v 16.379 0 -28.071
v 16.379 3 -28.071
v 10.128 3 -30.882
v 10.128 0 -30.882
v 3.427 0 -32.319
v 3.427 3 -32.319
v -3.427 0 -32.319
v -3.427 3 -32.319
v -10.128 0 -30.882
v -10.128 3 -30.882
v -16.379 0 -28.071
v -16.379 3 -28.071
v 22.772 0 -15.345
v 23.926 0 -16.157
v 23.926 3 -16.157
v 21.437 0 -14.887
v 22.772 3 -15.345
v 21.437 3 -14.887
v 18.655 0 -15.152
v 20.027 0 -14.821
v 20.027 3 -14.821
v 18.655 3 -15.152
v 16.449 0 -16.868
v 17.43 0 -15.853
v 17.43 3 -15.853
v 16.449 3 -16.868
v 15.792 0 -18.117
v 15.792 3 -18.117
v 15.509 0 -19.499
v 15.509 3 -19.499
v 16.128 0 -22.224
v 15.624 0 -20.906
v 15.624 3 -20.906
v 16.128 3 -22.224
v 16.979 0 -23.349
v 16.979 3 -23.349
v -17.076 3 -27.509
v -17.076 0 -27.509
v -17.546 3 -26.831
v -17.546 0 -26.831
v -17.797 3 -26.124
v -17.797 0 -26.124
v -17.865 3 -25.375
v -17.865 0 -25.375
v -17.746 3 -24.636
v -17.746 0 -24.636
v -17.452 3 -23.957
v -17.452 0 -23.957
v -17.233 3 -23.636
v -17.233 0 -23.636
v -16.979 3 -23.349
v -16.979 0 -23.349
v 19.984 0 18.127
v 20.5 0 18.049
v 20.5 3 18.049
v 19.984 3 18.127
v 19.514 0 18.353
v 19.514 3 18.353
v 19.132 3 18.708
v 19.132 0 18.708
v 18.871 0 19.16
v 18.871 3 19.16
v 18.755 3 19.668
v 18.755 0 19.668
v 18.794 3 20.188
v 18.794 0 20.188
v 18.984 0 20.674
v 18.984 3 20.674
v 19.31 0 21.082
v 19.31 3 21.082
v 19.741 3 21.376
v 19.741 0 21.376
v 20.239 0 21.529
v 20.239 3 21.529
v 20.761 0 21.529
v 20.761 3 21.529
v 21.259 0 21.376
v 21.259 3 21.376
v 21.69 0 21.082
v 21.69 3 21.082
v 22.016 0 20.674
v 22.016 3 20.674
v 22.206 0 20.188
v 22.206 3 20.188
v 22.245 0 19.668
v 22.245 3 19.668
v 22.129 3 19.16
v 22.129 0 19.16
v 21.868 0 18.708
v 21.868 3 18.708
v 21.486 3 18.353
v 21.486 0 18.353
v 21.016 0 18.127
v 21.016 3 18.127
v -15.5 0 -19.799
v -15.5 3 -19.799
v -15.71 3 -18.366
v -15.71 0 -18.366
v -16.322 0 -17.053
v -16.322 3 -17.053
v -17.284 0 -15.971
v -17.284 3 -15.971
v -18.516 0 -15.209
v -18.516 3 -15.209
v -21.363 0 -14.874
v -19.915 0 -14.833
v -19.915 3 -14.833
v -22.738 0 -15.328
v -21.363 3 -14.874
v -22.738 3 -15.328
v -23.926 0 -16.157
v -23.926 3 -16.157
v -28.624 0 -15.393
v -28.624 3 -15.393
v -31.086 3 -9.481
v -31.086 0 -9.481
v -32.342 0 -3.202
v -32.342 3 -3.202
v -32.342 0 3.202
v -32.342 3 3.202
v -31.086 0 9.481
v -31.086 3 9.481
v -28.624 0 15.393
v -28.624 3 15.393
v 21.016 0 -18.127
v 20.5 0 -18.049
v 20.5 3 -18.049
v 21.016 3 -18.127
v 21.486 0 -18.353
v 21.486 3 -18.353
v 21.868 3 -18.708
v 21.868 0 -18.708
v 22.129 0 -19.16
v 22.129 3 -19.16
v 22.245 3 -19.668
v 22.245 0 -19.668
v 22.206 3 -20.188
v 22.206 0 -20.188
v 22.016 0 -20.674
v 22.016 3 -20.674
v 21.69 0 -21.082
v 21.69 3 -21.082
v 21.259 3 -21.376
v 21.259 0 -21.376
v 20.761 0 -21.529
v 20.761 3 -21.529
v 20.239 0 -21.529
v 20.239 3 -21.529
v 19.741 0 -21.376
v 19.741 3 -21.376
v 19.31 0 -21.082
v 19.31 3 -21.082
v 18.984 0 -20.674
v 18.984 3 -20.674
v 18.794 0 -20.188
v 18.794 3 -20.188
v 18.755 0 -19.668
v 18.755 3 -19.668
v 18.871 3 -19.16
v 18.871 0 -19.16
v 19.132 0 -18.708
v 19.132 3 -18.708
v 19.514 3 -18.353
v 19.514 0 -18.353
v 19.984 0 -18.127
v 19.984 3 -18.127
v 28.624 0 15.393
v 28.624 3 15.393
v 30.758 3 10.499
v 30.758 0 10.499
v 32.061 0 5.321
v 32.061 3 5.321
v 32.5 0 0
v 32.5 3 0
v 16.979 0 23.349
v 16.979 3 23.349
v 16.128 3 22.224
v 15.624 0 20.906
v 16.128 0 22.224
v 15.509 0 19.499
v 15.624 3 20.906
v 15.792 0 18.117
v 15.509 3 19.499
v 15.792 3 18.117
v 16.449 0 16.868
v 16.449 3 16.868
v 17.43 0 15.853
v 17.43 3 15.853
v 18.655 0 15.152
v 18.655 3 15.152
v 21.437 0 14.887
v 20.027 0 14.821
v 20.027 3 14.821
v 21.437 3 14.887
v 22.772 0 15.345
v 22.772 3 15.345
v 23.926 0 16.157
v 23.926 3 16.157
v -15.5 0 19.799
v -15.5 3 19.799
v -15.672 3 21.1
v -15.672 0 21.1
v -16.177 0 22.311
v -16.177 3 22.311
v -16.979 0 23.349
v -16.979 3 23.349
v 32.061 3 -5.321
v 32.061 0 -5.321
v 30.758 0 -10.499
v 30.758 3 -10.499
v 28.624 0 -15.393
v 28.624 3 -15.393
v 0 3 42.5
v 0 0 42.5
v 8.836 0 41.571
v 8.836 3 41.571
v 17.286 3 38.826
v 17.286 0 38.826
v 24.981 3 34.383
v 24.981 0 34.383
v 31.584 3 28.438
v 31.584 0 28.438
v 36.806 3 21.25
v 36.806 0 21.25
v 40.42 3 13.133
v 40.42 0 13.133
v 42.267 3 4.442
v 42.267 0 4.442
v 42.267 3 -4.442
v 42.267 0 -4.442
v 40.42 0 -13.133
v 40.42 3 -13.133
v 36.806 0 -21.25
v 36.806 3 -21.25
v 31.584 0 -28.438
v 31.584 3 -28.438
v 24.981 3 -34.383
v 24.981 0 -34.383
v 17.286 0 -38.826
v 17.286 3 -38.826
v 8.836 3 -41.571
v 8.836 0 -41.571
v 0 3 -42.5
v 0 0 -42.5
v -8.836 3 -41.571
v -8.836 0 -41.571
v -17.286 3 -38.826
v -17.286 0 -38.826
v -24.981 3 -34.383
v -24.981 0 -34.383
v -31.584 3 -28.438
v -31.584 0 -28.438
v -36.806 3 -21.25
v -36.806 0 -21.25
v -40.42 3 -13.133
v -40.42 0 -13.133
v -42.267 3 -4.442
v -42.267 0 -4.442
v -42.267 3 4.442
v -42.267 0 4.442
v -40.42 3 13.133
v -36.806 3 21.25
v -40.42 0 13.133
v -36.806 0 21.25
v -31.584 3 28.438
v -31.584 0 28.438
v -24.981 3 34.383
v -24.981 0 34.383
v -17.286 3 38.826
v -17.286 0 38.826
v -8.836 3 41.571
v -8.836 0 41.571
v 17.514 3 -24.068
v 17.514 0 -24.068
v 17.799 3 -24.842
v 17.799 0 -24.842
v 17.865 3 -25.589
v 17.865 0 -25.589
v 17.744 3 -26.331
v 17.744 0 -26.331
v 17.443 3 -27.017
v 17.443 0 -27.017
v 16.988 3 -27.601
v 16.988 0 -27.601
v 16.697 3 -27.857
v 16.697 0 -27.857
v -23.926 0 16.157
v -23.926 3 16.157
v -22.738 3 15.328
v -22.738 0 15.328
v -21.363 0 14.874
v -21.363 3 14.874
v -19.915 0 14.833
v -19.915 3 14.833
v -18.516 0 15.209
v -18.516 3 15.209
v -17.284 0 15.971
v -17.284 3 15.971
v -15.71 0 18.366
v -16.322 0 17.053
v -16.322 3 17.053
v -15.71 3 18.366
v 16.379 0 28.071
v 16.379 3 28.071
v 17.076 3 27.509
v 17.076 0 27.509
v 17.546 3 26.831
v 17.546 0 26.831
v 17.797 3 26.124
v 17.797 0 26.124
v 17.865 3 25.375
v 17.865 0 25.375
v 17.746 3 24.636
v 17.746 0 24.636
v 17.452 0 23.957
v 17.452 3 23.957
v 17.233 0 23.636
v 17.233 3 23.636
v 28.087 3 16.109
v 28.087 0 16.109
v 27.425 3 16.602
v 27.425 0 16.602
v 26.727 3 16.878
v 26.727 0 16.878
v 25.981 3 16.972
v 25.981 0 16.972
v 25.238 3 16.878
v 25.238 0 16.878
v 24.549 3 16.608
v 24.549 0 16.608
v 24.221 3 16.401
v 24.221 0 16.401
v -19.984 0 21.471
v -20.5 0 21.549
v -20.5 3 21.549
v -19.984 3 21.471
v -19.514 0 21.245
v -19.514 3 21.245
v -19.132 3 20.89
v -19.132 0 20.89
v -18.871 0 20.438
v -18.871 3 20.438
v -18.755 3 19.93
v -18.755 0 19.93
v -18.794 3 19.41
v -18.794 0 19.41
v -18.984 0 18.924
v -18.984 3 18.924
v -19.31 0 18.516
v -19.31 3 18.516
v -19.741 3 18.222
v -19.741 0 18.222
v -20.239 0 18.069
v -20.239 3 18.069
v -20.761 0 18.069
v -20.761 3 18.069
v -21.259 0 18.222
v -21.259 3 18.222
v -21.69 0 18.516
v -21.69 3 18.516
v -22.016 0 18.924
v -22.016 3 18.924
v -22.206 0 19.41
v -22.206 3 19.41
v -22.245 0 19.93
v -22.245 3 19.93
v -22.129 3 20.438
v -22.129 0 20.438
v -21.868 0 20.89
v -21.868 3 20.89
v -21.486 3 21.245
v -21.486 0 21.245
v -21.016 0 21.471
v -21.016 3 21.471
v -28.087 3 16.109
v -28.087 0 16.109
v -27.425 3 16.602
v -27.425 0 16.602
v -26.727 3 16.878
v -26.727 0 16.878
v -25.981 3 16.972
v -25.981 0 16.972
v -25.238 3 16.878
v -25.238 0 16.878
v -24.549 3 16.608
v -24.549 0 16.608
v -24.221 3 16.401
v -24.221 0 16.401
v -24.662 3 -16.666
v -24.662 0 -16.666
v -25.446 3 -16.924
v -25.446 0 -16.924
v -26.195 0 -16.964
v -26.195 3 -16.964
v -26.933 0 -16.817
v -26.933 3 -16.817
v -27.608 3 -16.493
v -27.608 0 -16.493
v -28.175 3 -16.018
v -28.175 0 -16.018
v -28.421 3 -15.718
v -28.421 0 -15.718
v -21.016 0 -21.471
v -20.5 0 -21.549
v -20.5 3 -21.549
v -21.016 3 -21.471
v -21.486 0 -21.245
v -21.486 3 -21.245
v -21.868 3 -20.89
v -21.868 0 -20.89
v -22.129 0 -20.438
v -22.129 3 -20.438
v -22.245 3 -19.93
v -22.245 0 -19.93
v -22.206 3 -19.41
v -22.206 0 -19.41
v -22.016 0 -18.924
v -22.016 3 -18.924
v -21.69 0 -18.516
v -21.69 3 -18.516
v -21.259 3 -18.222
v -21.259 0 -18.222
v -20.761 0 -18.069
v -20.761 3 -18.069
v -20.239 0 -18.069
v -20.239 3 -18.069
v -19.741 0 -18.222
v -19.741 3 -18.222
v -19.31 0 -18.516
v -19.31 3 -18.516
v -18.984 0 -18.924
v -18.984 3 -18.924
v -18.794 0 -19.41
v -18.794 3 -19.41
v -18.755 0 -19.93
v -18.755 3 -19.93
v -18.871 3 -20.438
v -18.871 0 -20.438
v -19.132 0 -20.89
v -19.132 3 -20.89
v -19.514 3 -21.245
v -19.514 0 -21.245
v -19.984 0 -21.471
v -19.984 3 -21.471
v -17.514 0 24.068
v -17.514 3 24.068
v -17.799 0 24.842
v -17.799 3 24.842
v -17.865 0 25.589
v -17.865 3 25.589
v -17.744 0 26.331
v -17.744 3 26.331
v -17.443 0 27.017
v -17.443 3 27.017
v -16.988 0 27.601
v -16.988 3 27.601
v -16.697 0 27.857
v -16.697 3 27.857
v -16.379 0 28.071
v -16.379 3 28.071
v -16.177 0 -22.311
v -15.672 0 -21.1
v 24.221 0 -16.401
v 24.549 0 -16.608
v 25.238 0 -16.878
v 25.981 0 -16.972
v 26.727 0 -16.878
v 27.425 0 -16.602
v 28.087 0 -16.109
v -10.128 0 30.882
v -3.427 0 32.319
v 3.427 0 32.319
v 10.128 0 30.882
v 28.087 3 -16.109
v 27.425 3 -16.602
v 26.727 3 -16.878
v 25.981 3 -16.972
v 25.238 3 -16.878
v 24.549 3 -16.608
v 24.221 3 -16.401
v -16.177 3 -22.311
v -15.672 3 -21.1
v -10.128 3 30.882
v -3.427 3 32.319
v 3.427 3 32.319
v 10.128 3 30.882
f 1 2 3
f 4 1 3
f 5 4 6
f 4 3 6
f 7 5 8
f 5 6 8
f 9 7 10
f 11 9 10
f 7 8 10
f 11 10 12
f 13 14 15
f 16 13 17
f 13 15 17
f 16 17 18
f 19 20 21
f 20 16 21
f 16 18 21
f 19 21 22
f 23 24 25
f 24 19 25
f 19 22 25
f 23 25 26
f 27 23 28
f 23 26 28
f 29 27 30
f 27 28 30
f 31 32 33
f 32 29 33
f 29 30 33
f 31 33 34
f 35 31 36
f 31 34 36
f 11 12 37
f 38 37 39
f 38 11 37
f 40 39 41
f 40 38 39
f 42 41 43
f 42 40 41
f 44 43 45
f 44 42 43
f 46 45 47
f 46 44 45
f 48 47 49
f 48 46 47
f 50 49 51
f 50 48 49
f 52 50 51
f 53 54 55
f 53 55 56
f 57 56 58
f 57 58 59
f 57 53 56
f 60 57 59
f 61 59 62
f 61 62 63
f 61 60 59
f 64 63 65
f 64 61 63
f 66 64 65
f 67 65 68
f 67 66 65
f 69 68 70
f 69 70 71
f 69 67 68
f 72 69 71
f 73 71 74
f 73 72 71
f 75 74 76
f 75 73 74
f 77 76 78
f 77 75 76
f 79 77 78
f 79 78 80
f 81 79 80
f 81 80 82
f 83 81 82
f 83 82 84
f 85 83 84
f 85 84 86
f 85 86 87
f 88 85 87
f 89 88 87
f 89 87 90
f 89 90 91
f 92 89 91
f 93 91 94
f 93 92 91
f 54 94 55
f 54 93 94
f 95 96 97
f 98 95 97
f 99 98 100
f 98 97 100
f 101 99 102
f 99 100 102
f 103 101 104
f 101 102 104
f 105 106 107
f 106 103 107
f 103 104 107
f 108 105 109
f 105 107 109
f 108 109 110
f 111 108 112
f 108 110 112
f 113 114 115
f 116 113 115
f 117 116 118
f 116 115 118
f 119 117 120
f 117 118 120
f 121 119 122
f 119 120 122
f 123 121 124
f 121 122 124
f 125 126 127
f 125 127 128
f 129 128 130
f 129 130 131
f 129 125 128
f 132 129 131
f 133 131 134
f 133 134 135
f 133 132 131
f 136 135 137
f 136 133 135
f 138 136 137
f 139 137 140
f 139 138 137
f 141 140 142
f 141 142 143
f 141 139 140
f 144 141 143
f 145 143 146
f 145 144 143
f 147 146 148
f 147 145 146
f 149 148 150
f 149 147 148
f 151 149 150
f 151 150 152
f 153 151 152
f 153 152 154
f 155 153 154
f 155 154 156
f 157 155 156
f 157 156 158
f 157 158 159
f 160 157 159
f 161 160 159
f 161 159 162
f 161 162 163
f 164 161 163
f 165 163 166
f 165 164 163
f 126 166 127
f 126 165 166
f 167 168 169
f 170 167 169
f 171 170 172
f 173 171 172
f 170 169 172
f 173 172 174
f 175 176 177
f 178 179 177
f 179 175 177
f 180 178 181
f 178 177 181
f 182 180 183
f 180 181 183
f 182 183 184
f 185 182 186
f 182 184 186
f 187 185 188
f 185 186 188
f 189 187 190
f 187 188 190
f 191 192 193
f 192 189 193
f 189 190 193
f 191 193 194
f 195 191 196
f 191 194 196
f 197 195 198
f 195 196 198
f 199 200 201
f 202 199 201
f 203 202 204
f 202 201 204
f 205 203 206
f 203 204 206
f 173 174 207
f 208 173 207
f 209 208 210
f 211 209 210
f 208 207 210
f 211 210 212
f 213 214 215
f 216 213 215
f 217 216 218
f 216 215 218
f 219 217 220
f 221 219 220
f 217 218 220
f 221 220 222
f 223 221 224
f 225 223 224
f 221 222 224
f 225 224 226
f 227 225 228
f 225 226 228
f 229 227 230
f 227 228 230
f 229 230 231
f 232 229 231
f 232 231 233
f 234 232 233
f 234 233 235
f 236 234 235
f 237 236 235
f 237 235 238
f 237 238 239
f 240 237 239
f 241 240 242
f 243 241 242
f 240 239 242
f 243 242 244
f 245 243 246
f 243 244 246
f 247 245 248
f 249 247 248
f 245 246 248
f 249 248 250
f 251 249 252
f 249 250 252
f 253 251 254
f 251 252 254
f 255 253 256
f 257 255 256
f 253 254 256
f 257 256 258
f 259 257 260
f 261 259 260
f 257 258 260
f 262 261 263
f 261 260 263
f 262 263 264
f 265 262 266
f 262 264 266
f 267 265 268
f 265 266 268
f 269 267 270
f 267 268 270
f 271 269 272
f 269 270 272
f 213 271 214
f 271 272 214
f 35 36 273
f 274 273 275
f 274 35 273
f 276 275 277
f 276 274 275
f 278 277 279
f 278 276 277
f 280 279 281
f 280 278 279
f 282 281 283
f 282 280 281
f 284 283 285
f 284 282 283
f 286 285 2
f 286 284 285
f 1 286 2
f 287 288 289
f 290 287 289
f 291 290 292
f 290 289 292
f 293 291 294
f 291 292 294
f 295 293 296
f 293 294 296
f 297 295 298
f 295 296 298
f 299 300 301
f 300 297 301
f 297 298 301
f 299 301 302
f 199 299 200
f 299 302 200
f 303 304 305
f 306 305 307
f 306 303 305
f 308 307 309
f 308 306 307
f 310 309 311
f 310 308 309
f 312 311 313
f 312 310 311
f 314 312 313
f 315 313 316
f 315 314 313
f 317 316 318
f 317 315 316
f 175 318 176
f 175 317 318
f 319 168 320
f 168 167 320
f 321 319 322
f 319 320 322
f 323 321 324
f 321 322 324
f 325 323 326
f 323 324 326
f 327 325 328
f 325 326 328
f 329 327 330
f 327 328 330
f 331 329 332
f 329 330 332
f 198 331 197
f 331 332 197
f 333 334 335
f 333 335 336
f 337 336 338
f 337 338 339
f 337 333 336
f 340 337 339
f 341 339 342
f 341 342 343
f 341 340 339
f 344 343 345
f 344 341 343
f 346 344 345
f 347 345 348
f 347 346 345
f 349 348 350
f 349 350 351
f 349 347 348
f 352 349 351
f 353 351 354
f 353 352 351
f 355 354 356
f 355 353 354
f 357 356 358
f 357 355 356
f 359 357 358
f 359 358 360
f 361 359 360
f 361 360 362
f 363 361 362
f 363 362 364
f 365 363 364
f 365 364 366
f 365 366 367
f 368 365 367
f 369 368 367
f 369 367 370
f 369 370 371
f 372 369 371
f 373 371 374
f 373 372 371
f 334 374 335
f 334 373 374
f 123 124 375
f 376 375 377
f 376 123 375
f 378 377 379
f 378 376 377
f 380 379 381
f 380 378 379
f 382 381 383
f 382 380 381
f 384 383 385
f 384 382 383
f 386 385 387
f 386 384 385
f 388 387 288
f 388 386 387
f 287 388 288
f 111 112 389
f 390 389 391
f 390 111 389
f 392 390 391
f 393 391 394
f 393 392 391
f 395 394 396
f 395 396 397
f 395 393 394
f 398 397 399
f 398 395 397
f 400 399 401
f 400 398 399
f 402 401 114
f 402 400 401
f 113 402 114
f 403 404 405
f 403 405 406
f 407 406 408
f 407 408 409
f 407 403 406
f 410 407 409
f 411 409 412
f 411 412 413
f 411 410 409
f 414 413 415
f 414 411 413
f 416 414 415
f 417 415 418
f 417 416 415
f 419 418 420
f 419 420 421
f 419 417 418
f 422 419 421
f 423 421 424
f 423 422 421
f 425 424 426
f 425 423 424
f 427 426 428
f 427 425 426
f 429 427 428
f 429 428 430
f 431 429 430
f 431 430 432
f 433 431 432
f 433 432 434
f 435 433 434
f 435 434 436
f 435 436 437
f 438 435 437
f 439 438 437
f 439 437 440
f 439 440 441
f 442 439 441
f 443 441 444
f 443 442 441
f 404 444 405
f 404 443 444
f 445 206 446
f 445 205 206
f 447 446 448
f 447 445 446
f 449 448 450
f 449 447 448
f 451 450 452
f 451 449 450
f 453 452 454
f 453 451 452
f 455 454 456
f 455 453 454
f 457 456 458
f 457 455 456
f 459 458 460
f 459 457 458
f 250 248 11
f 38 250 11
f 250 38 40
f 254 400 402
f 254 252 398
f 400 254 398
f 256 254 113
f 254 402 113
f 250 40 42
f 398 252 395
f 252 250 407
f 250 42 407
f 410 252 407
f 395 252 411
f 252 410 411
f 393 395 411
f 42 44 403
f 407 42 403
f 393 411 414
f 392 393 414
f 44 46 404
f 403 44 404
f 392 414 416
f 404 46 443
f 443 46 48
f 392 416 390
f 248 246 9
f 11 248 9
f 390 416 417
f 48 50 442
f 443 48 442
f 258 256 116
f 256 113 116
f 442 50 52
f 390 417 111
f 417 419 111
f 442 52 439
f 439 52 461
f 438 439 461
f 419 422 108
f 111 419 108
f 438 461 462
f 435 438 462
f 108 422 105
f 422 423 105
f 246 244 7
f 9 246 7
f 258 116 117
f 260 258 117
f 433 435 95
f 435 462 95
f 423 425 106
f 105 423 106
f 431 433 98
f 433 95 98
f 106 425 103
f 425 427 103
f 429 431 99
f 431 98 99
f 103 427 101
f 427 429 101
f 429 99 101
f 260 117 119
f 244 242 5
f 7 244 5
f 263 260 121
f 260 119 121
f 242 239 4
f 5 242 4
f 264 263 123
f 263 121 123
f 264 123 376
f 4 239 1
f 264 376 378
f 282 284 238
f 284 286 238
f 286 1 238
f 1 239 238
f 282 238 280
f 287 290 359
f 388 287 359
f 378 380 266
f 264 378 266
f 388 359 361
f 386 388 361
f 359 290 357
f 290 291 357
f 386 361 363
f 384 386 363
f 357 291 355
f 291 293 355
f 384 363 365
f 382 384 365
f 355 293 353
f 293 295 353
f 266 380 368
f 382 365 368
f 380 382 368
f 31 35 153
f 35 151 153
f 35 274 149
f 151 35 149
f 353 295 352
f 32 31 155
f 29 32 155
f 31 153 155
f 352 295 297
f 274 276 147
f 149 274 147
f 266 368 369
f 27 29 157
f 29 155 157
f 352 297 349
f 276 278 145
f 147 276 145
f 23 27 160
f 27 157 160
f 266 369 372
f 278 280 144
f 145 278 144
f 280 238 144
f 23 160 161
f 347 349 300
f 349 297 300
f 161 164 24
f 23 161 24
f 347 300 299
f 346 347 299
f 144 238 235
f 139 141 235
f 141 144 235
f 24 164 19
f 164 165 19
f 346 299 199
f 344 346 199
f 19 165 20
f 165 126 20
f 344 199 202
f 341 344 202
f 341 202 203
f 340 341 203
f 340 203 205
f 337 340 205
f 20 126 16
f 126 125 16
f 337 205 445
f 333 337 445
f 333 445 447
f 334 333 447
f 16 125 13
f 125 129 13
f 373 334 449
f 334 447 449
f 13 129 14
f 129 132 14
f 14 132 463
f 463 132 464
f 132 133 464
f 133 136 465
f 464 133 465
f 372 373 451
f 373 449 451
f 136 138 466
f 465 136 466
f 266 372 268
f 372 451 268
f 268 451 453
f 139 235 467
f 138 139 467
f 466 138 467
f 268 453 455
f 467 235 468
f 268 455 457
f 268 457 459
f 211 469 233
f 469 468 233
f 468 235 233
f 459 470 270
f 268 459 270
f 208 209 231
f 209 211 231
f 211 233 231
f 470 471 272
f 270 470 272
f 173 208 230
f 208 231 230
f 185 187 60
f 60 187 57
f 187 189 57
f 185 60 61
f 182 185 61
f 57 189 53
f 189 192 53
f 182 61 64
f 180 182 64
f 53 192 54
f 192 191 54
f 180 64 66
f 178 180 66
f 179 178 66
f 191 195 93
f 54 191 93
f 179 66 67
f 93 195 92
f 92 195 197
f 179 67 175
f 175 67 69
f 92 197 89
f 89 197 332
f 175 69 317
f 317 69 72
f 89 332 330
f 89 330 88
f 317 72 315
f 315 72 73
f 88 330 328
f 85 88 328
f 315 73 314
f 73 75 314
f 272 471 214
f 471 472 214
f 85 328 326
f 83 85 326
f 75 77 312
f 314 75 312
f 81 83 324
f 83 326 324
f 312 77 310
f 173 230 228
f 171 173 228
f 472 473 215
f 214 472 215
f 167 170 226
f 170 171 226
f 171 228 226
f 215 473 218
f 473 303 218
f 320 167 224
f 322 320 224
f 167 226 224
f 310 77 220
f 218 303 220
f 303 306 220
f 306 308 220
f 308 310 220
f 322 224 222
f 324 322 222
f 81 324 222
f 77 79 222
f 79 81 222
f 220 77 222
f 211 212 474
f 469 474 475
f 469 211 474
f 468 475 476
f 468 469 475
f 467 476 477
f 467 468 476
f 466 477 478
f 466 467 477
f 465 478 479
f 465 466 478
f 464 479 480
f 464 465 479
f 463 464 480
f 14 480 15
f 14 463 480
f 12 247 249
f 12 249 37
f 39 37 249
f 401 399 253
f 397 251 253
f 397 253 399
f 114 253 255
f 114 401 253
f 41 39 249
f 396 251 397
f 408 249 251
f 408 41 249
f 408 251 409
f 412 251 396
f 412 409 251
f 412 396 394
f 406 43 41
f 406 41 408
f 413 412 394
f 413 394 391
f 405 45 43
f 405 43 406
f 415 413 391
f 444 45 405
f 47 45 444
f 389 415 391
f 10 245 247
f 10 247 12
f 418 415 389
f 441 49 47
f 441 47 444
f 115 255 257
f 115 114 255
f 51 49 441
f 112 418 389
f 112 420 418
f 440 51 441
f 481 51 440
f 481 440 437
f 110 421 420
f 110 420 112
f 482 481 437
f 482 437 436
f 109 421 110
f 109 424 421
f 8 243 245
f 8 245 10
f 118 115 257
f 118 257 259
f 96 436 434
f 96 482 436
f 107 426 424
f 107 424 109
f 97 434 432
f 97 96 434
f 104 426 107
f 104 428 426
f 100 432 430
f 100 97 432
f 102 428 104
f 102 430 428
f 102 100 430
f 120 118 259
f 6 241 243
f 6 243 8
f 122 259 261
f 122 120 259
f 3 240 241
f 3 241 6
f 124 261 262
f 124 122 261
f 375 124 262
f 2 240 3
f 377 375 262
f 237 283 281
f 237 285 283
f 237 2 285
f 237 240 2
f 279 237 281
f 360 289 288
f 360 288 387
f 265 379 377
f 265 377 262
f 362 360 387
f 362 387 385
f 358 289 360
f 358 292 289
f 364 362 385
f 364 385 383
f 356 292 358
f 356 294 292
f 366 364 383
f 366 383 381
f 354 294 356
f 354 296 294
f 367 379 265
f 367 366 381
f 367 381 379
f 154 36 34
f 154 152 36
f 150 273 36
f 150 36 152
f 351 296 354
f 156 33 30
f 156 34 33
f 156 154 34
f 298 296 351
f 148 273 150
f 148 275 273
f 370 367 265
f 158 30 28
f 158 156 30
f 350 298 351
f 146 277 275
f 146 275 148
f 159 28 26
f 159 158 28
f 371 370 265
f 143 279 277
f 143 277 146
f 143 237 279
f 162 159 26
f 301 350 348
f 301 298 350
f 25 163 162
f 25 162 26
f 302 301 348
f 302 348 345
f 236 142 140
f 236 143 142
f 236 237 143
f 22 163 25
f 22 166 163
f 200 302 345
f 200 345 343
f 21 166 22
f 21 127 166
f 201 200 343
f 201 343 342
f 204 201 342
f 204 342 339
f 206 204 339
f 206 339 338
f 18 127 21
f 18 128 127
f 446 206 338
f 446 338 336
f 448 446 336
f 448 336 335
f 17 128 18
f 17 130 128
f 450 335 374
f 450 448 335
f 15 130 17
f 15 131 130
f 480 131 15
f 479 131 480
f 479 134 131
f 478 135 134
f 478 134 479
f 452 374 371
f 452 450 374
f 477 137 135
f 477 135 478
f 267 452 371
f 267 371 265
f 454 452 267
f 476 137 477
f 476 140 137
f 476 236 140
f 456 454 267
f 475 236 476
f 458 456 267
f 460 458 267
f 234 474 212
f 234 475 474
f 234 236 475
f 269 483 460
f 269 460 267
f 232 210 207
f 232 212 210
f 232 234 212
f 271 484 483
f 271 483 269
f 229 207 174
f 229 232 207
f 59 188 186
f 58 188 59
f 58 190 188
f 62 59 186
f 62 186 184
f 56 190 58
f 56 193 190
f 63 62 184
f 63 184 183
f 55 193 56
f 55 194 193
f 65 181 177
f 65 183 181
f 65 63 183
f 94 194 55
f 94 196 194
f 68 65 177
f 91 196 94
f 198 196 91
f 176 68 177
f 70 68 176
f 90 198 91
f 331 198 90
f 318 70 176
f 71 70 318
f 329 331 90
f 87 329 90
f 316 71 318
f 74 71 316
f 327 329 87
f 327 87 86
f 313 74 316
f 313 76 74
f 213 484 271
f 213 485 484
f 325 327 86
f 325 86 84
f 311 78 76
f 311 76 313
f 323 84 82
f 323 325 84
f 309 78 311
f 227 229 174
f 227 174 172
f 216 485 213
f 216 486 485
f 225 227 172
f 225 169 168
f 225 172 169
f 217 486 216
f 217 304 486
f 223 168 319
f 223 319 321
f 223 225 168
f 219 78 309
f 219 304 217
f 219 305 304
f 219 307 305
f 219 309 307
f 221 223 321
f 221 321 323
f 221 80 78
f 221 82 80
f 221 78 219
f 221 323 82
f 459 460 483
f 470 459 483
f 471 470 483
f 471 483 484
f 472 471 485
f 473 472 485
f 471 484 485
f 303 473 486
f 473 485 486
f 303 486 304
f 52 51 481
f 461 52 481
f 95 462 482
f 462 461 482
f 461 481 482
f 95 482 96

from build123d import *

# Parameters (mm, degrees)
SKETCH_1_R          = 45
SKETCH_1_R_2        = 2
EXTRUDE_1_DEPTH     = 3
CUT_EXTRUDE_1_DEPTH = 64.710281745
FILLET_1_R          = 3
MOVE_FACE_1_BY      = 2.5
MOVE_FACE_2_BY      = 0.15
MOVE_FACE_2_2_BY    = 0.15
MOVE_FACE_2_3_BY    = 0.15
MOVE_FACE_2_4_BY    = 0.15
MOVE_FACE_3_BY      = 0.4
MOVE_FACE_3_2_BY    = 0.4
MOVE_FACE_3_3_BY    = 0.4
MOVE_FACE_3_4_BY    = 0.4


with BuildPart() as part:
    # ｽｹｯﾁ1 → ﾎﾞｽ - 押し出し1 (new body)
    with BuildSketch(Plane(origin=(0, 0, 0), x_dir=(1, 0, 0), z_dir=(0, 1, 0))):
        with Locations(Location((0, 0, 0), (0, 0, 270))):
            Circle(SKETCH_1_R)
        with Locations(Location((-20.5, -19.798989873, 0), (0, 0, 270))):
            Circle(SKETCH_1_R_2, mode=Mode.SUBTRACT)
        with Locations(Location((20.5, -19.798989873, 0), (0, 0, 90))):
            Circle(SKETCH_1_R_2, mode=Mode.SUBTRACT)
        with Locations(Location((20.5, 19.798989873, 0), (0, 0, 270))):
            Circle(SKETCH_1_R_2, mode=Mode.SUBTRACT)
        with Locations(Location((-20.5, 19.798989873, 0), (0, 0, 90))):
            Circle(SKETCH_1_R_2, mode=Mode.SUBTRACT)
    extrude(amount=EXTRUDE_1_DEPTH)

    # ｽｹｯﾁ2 → ｶｯﾄ - 押し出し1 (cut, through all)
    with BuildSketch(Plane(origin=(0, 3, 0), x_dir=(1, 0, 0), z_dir=(0, 1, 0))):
        with BuildLine():
            ThreePointArc((25.486471606, -20.166550649), (30.696582279, -10.675665619), (32.5, 0))
            ThreePointArc((32.5, 0), (30.696582279, 10.675665619), (25.486471606, 20.166550649))
            ThreePointArc((25.486471606, 20.166550649), (25.496616757, 19.9828947), (25.5, 19.798989873))
            ThreePointArc((25.5, 19.798989873), (16.778183392, 16.460115641), (21.040767545, 24.769660901))
            ThreePointArc((21.040767545, 24.769660901), (0, 32.5), (-21.040767545, 24.769660901))
            ThreePointArc((-21.040767545, 24.769660901), (-17.161125768, 23.520806481), (-15.5, 19.798989873))
            ThreePointArc((-15.5, 19.798989873), (-20.683904827, 14.802373116), (-25.486471606, 20.166550649))
            ThreePointArc((-25.486471606, 20.166550649), (-32.5, 0), (-25.486471606, -20.166550649))
            ThreePointArc((-25.486471606, -20.166550649), (-20.683904827, -14.802373116), (-15.5, -19.798989873))
            ThreePointArc((-15.5, -19.798989873), (-17.161125768, -23.520806481), (-21.040767545, -24.769660901))
            ThreePointArc((-21.040767545, -24.769660901), (0, -32.5), (21.040767545, -24.769660901))
            ThreePointArc((21.040767545, -24.769660901), (16.778183392, -16.460115641), (25.5, -19.798989873))
            ThreePointArc((25.5, -19.798989873), (25.496616757, -19.9828947), (25.486471606, -20.166550649))
        make_face()
    extrude(amount=-CUT_EXTRUDE_1_DEPTH, mode=Mode.SUBTRACT)

    # ﾌｨﾚｯﾄ1
    fillet_1_edges = [part.edges().sort_by_distance(p)[0] for p in [
        (21.040767545, 1.5, -24.769660901),
        (25.486471606, 1.5, -20.166550649),
        (25.486471606, 1.5, 20.166550649),
        (21.040767545, 1.5, 24.769660901),
        (-21.040767545, 1.5, 24.769660901),
        (-25.486471606, 1.5, 20.166550649),
        (-25.486471606, 1.5, -20.166550649),
        (-21.040767545, 1.5, -24.769660901),
    ]]
    fillet(fillet_1_edges, radius=FILLET_1_R)

    # Move Face 1: a curved face moved inward by 2.5
    add(Solid.thicken(part.faces().sort_by_distance((0, 1.5, -45))[0], -MOVE_FACE_1_BY), mode=Mode.SUBTRACT)

    # Move Face 2: a curved face moved inward by 0.15
    add(Solid.thicken(part.faces().sort_by_distance((20.5, 1.5, -21.798989873))[0], -MOVE_FACE_2_BY), mode=Mode.SUBTRACT)

    # Move Face 2 2: a curved face moved inward by 0.15
    add(Solid.thicken(part.faces().sort_by_distance((-20.5, 1.5, -17.798989873))[0], -MOVE_FACE_2_2_BY), mode=Mode.SUBTRACT)

    # Move Face 2 3: a curved face moved inward by 0.15
    add(Solid.thicken(part.faces().sort_by_distance((-20.5, 1.5, 17.798989873))[0], -MOVE_FACE_2_3_BY), mode=Mode.SUBTRACT)

    # Move Face 2 4: a curved face moved inward by 0.15
    add(Solid.thicken(part.faces().sort_by_distance((20.5, 1.5, 21.798989873))[0], -MOVE_FACE_2_4_BY), mode=Mode.SUBTRACT)

    # Move Face 3: a curved face moved outward by 0.4
    add(Solid.thicken(part.faces().sort_by_distance((-20.5, 1.5, 17.648989873))[0], MOVE_FACE_3_BY))

    # Move Face 3 2: a curved face moved outward by 0.4
    add(Solid.thicken(part.faces().sort_by_distance((20.5, 1.5, 21.948989873))[0], MOVE_FACE_3_2_BY))

    # Move Face 3 3: a curved face moved outward by 0.4
    add(Solid.thicken(part.faces().sort_by_distance((20.5, 1.5, -21.948989873))[0], MOVE_FACE_3_3_BY))

    # Move Face 3 4: a curved face moved outward by 0.4
    add(Solid.thicken(part.faces().sort_by_distance((-20.5, 1.5, -17.648989873))[0], MOVE_FACE_3_4_BY))


solid = part.part
